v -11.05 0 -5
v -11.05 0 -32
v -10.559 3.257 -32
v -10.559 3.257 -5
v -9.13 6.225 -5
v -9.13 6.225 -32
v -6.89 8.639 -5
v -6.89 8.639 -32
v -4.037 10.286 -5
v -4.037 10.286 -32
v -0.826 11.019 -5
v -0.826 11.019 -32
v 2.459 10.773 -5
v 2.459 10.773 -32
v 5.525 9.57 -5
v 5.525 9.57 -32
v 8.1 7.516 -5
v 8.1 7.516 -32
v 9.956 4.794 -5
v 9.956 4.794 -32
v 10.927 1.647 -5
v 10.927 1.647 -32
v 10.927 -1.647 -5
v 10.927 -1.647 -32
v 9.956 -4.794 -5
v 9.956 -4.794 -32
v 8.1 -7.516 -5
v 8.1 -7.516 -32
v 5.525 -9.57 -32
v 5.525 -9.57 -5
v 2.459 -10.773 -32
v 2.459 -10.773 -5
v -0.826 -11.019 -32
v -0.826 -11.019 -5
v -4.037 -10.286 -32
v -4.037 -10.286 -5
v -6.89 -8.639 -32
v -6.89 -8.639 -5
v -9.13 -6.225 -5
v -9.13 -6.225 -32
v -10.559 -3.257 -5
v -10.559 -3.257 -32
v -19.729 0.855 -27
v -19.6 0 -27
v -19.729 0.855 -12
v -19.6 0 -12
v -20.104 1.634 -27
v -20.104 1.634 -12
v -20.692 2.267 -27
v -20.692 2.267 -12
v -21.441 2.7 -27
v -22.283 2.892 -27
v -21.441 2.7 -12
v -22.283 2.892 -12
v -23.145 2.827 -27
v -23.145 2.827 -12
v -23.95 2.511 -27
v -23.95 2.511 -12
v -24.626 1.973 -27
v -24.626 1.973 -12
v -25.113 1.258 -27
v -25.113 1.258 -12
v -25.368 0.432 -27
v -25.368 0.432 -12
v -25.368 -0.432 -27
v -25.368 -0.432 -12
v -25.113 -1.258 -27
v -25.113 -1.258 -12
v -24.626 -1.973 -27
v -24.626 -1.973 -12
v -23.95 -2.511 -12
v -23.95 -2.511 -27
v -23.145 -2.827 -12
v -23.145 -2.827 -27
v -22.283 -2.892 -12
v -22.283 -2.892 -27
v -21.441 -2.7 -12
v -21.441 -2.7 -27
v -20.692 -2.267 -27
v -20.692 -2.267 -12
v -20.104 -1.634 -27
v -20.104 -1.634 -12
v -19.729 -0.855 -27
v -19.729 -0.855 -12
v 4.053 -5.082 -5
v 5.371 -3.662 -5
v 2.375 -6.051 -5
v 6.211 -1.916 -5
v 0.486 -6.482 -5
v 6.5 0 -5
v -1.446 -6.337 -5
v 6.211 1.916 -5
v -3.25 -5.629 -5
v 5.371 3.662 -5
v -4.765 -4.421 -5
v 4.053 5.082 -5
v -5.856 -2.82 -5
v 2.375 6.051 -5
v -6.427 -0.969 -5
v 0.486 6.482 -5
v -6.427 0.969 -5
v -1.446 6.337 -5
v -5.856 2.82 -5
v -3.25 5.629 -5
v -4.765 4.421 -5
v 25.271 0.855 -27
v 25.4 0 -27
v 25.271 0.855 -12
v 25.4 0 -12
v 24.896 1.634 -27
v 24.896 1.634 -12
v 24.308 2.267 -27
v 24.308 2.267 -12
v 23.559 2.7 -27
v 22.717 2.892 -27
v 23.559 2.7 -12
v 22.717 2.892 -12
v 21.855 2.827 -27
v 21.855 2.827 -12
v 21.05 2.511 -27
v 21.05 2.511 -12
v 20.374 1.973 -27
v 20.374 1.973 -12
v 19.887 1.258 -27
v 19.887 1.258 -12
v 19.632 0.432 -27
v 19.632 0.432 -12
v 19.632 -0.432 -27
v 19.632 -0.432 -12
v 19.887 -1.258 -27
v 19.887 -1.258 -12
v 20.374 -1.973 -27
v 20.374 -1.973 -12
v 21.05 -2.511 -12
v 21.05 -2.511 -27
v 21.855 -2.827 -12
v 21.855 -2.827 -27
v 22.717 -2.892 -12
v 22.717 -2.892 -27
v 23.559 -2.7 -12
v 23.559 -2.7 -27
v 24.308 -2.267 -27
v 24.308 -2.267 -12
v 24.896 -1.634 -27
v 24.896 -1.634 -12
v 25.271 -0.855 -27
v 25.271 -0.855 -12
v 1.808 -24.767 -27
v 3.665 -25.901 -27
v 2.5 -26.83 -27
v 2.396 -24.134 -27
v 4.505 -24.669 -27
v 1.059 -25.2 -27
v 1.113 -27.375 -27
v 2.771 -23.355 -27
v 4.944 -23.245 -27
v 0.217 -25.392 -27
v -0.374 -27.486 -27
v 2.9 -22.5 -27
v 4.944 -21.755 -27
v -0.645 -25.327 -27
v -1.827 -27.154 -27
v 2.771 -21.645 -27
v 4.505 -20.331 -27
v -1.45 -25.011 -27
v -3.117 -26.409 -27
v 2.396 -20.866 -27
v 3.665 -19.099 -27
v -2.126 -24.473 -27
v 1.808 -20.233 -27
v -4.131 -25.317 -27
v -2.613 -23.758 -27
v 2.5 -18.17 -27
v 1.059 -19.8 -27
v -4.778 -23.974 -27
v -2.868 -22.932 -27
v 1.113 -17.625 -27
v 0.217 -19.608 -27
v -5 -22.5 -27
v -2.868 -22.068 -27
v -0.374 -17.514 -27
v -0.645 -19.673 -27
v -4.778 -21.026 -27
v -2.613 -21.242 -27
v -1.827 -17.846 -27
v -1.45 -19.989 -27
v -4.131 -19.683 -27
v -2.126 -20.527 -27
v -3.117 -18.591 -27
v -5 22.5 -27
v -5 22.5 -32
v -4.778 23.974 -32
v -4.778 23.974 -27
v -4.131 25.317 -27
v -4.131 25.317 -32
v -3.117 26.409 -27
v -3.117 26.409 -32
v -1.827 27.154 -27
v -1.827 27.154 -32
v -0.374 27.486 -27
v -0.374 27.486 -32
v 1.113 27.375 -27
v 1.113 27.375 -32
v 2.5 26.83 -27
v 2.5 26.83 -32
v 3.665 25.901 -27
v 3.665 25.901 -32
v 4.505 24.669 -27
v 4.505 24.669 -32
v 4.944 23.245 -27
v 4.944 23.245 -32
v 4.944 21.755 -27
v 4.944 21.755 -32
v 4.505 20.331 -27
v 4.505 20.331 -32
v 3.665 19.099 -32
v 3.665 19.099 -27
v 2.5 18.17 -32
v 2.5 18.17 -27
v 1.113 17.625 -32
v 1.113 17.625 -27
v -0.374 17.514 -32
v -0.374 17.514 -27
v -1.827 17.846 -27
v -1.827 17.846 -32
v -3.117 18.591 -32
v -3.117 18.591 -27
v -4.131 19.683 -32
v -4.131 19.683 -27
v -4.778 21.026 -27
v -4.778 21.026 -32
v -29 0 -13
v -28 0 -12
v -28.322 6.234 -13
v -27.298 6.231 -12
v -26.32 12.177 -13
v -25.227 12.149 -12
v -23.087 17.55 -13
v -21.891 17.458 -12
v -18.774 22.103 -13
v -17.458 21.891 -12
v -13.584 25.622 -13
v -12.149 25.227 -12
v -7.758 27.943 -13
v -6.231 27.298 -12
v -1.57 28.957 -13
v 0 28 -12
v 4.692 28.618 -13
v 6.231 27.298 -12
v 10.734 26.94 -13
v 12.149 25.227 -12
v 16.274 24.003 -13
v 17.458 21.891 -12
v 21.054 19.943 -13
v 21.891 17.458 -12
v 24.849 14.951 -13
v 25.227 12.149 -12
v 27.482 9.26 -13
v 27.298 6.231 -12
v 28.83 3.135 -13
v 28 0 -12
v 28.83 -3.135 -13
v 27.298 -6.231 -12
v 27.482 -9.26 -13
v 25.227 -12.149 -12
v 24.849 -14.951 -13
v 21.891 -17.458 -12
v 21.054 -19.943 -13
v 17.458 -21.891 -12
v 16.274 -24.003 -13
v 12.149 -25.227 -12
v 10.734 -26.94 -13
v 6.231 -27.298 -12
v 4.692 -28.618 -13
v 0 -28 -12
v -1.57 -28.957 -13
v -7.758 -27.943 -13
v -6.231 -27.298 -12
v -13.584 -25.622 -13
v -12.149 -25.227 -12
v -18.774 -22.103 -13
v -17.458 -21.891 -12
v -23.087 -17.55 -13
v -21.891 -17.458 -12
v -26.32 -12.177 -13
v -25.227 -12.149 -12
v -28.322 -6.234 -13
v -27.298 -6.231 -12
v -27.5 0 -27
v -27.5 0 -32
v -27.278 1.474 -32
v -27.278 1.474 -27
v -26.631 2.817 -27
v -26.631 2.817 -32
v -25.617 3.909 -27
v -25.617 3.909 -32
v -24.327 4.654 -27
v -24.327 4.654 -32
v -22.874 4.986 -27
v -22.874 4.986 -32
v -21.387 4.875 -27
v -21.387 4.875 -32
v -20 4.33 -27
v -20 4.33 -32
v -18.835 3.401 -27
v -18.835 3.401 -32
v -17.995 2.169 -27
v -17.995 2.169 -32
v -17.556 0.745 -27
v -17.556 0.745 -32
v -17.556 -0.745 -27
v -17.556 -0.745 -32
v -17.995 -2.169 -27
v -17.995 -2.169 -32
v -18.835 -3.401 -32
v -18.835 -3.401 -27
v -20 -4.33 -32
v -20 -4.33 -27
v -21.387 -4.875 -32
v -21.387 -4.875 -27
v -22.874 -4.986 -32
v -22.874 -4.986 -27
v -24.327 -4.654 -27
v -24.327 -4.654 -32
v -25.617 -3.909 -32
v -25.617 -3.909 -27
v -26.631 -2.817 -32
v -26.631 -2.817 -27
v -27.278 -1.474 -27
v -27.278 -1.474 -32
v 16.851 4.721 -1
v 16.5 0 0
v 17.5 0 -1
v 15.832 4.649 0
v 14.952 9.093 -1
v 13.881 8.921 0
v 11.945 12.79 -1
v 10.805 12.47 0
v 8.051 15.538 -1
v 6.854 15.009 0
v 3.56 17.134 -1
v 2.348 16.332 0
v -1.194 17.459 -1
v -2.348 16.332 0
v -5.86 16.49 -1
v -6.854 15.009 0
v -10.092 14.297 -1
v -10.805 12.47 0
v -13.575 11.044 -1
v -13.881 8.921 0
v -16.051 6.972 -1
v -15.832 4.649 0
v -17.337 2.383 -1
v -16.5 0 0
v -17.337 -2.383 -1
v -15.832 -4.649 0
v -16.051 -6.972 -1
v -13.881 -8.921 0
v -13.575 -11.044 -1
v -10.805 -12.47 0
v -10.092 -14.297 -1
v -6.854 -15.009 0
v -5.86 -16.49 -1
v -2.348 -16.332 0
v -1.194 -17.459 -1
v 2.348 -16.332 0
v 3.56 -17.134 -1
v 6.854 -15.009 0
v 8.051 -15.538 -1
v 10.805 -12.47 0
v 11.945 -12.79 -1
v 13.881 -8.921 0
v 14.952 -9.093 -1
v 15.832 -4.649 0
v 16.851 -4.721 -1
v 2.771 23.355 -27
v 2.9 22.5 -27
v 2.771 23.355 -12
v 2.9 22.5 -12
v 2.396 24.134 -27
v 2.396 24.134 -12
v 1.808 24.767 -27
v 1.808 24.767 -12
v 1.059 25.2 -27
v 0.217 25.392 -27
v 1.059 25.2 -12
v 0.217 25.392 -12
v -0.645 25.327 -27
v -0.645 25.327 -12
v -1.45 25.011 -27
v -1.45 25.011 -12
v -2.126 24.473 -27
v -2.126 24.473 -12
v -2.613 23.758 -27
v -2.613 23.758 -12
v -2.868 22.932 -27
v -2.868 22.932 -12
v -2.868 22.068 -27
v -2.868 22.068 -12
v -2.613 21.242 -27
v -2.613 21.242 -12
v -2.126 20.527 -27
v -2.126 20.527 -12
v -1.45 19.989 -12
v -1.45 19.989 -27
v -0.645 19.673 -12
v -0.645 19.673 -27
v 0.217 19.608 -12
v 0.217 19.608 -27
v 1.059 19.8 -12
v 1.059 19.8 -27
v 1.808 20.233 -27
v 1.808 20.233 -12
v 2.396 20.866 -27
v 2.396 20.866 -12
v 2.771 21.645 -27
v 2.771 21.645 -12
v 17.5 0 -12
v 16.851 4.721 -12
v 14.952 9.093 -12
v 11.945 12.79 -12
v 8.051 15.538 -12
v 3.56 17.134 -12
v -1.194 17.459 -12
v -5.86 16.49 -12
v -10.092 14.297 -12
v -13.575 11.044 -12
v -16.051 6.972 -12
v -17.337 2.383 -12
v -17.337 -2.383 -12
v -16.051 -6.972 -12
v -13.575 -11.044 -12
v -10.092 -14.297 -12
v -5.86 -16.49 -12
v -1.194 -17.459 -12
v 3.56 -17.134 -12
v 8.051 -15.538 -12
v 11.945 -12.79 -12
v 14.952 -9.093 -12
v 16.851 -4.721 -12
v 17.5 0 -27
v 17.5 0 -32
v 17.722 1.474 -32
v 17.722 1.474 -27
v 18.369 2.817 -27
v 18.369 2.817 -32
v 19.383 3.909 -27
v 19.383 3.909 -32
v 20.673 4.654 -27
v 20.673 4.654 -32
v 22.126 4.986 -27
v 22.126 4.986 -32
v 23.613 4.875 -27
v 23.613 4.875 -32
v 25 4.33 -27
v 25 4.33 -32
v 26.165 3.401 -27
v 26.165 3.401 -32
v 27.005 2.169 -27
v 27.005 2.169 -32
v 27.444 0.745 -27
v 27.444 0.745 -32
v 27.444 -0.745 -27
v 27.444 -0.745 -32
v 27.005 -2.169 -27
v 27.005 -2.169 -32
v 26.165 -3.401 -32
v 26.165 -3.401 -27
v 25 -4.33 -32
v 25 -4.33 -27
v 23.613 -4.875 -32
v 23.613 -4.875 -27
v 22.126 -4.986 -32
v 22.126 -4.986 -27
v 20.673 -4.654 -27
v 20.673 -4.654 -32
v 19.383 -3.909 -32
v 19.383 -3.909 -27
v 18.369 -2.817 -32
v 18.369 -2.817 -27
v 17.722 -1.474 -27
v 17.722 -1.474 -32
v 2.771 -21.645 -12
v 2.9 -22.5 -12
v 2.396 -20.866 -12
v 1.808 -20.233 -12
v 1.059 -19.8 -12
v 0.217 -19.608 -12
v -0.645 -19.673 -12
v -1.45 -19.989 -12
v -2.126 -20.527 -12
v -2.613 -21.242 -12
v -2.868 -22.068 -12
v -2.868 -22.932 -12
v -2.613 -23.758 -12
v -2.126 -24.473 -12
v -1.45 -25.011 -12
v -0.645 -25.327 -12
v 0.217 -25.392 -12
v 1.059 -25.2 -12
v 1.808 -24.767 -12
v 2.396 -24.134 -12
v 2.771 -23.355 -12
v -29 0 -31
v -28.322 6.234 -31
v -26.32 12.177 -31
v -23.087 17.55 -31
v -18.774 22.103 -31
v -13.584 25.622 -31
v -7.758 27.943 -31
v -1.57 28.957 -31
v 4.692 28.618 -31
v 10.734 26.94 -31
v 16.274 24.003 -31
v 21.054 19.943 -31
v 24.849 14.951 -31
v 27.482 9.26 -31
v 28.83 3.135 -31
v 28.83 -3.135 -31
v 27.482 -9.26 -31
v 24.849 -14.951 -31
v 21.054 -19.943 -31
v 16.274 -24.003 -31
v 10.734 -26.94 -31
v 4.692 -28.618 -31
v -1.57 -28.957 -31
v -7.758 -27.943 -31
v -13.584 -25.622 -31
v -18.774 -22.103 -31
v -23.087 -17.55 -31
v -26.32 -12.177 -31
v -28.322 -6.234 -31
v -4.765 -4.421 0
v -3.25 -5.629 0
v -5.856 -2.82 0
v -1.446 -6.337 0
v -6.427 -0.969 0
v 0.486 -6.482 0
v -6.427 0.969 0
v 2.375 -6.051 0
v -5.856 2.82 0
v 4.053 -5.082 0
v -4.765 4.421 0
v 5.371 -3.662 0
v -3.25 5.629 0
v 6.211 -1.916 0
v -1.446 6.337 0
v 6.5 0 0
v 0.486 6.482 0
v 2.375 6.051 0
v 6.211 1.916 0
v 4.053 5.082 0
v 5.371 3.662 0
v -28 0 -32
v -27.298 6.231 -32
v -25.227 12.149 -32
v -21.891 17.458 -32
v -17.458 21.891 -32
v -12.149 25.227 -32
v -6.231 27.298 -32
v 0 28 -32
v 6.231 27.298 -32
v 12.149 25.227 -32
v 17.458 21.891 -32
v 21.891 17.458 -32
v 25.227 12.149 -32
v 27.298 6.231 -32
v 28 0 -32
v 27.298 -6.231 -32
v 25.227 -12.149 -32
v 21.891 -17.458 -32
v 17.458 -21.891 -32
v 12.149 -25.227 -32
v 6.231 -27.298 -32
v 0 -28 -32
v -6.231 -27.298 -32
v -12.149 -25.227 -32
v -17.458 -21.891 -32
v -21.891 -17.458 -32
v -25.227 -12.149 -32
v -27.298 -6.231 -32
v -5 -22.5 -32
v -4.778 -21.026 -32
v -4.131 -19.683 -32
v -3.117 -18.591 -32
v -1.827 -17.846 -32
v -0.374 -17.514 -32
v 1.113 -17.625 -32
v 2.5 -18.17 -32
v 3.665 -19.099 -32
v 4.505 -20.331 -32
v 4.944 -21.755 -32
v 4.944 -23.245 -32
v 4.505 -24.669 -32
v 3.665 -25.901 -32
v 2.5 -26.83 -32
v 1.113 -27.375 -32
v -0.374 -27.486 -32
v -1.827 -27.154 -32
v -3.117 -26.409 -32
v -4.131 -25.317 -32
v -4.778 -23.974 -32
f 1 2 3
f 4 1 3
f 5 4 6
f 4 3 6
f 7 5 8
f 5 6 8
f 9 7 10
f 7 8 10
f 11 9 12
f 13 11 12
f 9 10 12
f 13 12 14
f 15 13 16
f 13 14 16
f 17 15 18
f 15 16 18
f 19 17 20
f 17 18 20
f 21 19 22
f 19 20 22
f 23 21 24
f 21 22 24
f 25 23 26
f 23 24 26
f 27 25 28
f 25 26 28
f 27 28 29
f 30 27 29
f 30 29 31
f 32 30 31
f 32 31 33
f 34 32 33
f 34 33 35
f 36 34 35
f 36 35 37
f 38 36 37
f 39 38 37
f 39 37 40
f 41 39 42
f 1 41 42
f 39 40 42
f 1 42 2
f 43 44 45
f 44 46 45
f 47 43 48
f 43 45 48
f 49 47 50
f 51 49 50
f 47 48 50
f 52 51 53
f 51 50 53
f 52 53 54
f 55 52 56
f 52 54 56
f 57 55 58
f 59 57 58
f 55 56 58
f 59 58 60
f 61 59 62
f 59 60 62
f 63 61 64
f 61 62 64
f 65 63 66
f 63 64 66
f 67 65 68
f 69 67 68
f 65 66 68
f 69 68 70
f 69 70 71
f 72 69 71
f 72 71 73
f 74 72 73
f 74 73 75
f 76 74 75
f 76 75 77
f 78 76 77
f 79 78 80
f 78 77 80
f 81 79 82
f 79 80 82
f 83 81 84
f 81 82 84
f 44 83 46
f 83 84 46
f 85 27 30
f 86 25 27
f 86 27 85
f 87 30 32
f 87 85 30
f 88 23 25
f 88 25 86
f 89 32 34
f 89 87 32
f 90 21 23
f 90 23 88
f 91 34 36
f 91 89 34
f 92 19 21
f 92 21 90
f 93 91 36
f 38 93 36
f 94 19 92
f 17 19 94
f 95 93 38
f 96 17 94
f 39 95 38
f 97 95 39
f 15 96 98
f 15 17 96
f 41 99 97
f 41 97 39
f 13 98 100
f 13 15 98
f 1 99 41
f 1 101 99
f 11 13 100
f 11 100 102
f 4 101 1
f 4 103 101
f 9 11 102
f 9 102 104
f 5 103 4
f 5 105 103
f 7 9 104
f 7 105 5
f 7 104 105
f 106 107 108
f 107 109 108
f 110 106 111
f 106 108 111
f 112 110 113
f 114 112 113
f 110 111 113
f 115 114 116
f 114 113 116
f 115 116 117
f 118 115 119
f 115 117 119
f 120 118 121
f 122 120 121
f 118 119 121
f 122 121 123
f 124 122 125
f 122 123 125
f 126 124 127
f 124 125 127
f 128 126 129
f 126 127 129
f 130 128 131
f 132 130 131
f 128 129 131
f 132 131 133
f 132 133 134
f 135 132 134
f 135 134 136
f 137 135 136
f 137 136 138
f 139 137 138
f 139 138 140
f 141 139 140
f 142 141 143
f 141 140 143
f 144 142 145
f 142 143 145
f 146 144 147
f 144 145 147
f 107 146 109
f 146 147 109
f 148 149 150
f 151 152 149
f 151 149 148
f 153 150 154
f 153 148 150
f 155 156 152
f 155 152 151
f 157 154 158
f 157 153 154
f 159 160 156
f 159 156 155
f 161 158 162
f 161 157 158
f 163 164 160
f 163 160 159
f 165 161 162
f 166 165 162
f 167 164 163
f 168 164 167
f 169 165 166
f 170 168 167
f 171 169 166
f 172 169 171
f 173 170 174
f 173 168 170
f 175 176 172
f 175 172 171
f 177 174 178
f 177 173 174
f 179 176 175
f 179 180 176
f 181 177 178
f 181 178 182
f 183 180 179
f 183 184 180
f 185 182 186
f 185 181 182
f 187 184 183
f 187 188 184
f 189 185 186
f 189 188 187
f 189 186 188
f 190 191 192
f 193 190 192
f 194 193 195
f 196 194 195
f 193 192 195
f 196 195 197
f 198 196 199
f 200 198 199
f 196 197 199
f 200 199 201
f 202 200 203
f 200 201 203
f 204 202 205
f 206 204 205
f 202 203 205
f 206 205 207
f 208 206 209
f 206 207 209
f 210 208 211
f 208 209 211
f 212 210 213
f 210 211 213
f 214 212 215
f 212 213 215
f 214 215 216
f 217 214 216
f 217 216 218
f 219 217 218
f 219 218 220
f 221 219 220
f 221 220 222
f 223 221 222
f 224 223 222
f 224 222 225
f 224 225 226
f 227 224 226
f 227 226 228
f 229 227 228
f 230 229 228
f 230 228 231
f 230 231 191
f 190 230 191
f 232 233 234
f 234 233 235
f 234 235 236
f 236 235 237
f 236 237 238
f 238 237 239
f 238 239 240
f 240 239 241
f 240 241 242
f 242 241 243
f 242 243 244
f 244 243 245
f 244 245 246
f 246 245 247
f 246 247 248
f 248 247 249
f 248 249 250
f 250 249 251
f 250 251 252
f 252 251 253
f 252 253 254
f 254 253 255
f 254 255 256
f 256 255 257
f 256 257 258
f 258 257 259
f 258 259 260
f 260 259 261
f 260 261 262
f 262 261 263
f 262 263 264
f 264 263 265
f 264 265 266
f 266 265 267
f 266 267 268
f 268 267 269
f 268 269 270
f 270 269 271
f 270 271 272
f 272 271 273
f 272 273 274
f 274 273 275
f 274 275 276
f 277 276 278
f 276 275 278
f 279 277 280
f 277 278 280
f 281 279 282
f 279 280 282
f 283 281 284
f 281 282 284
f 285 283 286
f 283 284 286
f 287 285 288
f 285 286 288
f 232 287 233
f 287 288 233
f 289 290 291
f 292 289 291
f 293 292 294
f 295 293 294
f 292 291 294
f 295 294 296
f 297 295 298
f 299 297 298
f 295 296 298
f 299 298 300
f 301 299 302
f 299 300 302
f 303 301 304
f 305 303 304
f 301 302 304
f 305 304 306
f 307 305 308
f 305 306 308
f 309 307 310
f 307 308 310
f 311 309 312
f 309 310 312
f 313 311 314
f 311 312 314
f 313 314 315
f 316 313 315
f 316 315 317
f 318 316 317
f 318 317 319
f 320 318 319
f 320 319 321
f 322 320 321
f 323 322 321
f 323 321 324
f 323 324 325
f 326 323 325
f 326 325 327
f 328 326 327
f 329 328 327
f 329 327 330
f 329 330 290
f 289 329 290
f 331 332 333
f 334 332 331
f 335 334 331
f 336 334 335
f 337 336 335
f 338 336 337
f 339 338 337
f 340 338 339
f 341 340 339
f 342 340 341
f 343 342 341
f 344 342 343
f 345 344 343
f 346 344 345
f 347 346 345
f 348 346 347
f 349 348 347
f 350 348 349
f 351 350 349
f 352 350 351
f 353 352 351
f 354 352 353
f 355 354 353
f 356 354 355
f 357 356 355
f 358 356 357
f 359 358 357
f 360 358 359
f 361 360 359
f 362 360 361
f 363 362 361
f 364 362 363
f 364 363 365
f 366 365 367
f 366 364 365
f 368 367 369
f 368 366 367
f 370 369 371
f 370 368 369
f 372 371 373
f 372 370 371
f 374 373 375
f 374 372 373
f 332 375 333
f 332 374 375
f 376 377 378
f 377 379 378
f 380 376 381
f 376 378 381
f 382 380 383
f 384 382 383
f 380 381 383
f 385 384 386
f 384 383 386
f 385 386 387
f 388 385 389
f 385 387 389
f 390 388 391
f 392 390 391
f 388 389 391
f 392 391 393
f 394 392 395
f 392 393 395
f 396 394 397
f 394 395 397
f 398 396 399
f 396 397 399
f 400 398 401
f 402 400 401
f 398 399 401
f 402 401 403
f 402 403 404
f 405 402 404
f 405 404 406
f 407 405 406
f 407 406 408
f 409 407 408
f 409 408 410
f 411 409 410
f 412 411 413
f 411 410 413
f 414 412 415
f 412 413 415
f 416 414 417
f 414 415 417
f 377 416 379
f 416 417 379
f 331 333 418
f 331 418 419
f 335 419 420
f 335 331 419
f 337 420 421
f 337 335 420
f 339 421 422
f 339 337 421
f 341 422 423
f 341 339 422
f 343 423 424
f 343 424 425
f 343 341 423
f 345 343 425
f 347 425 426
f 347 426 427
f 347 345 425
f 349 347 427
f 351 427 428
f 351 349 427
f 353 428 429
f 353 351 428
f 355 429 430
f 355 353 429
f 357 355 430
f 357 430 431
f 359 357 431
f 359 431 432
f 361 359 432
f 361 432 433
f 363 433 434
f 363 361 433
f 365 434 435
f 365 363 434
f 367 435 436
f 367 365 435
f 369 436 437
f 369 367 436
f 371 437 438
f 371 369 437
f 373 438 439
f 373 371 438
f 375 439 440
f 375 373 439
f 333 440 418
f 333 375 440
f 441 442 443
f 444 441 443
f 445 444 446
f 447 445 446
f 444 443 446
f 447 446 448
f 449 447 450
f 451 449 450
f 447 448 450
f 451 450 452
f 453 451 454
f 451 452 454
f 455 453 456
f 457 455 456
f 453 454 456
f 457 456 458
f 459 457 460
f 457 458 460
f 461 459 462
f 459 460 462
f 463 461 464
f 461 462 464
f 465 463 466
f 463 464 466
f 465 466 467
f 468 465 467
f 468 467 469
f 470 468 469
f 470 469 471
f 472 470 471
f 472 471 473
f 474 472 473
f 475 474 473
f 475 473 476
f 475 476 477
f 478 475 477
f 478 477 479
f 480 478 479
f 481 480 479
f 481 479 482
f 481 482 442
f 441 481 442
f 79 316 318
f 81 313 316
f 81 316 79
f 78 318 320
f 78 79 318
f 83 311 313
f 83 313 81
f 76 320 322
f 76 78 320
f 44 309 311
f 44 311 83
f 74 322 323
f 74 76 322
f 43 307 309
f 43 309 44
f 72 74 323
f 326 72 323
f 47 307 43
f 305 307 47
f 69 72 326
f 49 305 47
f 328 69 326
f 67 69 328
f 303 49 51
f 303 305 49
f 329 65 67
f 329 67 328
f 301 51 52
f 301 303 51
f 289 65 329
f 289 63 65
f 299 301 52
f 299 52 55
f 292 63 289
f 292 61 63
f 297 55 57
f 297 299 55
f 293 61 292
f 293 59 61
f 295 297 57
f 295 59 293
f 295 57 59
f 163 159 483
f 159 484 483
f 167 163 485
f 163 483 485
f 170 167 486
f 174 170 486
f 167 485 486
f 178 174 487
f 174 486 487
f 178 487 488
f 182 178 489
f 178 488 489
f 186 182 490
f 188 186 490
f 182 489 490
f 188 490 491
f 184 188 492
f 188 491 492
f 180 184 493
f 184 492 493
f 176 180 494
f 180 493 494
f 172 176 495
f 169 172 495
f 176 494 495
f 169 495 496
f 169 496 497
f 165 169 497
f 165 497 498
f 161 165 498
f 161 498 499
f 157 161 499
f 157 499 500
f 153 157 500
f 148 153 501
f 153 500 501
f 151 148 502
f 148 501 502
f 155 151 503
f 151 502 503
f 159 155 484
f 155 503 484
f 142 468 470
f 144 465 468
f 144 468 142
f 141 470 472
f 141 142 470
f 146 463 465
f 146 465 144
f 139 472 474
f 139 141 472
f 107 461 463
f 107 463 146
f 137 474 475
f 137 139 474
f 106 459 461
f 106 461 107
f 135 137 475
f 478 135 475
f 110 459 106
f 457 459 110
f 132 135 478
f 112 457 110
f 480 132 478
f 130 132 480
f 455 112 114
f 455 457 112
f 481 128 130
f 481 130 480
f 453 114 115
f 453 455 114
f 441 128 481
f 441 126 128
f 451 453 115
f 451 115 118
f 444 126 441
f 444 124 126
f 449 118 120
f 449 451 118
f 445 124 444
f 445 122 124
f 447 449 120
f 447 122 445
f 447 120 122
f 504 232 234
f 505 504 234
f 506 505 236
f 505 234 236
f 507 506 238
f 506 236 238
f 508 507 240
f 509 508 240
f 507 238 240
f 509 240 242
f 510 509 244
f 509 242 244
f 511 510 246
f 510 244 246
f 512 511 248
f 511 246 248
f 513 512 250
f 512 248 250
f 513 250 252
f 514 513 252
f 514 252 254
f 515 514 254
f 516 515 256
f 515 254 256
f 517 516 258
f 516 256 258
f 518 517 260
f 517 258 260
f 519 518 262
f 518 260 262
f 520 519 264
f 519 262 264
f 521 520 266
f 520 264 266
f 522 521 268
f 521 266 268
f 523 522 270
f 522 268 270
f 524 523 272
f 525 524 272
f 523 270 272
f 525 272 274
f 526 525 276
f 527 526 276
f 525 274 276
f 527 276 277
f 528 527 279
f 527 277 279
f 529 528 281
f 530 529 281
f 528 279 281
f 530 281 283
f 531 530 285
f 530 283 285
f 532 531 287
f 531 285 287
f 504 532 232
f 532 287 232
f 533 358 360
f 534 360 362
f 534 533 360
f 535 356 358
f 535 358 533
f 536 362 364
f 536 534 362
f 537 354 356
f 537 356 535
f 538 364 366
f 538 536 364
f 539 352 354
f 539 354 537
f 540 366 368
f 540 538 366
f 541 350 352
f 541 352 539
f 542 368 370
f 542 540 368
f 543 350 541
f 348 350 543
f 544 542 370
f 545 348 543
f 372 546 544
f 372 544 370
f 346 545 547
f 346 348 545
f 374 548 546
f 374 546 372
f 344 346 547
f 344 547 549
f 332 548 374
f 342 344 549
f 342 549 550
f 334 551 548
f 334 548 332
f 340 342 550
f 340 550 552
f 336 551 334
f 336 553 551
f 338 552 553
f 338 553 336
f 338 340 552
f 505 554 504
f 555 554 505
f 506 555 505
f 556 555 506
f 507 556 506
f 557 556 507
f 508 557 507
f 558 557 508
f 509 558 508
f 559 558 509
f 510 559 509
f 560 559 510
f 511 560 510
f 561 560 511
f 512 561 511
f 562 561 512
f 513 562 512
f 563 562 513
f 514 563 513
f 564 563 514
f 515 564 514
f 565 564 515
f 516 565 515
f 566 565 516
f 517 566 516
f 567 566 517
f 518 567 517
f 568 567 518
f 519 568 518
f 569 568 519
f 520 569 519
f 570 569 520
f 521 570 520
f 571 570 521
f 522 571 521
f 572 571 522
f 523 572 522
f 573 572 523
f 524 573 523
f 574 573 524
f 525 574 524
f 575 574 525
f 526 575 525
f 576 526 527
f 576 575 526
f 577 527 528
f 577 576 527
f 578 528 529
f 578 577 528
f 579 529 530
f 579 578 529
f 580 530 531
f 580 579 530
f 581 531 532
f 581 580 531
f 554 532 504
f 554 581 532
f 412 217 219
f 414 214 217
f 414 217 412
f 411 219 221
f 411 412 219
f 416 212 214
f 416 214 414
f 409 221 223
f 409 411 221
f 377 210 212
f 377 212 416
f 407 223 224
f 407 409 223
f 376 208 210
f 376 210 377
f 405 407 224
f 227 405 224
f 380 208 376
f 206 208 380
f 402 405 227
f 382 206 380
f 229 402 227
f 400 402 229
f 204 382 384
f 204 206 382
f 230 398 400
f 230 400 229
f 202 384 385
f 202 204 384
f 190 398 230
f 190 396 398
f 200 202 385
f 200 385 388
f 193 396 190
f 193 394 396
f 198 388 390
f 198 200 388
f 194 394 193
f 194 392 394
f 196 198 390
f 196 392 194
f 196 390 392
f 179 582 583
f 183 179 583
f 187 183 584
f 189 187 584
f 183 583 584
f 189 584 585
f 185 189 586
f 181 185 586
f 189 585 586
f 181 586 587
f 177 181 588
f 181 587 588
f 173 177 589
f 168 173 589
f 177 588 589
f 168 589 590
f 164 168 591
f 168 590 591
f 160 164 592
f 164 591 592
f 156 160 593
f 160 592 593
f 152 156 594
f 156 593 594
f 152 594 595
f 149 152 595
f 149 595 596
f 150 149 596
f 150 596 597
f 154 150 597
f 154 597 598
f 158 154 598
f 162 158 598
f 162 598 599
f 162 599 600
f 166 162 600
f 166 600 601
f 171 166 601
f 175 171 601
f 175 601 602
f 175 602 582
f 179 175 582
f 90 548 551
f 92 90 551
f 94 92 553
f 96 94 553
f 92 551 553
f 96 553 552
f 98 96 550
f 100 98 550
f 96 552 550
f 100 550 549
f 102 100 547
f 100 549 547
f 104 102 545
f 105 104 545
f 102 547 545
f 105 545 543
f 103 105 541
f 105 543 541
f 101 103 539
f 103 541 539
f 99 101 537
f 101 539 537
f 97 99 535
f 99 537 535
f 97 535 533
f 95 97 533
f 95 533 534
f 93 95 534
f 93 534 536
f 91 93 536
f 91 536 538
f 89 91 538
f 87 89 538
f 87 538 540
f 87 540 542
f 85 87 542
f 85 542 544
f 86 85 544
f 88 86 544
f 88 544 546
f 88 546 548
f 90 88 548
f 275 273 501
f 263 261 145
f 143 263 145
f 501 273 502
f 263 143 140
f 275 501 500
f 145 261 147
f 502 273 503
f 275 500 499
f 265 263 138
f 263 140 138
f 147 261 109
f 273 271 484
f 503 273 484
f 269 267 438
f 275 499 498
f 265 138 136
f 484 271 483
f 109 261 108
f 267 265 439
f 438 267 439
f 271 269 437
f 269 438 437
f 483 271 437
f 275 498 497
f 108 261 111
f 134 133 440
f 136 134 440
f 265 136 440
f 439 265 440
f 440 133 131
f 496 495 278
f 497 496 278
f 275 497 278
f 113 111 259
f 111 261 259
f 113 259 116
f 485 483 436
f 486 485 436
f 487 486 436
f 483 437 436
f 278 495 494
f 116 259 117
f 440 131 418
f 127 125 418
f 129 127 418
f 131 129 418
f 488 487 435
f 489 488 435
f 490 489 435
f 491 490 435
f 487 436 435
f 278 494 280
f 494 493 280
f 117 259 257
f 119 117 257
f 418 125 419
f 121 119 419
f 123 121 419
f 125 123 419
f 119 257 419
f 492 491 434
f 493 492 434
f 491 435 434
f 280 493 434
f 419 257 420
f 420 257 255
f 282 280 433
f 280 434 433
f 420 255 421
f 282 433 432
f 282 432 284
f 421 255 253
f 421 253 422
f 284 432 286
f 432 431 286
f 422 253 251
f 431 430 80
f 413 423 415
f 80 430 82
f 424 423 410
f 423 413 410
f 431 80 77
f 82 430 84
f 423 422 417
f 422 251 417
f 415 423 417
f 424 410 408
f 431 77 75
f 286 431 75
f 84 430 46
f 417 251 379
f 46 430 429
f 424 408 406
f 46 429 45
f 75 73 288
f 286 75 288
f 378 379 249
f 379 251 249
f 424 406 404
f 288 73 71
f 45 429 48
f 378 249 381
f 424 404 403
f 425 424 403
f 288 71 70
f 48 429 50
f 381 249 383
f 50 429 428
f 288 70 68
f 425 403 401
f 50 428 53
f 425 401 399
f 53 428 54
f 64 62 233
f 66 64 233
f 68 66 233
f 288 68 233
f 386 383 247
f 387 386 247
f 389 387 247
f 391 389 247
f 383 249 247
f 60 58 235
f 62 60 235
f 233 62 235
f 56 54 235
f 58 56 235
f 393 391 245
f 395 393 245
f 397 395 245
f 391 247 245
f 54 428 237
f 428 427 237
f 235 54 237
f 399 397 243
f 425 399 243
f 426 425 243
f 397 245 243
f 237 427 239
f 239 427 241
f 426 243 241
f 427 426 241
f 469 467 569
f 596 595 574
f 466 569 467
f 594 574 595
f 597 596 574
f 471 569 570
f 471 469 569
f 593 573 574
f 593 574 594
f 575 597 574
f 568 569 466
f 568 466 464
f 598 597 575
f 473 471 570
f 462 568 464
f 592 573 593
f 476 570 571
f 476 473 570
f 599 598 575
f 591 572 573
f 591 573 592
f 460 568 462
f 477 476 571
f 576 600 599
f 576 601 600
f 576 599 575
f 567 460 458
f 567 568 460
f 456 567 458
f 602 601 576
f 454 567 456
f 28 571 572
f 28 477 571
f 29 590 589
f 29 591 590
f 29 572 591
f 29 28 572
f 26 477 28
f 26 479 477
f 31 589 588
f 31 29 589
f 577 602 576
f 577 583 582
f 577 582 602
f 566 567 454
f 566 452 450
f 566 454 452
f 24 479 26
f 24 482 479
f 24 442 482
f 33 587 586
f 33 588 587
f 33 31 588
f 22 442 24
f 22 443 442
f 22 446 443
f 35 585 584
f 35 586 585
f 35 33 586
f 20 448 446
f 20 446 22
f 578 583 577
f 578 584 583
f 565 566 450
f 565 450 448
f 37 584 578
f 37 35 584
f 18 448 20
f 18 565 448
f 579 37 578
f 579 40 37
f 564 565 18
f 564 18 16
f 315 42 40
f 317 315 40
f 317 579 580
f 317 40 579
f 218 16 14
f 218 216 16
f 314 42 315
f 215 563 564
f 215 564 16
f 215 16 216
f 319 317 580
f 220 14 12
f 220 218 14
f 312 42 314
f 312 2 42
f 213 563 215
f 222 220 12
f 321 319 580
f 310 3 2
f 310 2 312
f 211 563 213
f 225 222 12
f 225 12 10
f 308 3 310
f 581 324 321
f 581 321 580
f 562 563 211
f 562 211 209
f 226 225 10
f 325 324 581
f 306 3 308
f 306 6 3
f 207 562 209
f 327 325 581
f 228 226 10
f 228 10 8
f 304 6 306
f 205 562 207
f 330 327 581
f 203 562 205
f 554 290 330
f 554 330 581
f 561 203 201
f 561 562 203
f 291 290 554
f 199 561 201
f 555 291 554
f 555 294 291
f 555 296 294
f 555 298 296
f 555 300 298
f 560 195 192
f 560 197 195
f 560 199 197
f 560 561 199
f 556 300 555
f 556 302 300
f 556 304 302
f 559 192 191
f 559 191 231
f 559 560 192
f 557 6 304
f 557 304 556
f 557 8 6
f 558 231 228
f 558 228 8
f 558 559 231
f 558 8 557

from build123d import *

# Parameters (mm, degrees)
SKETCH_1_R                   = 17.5
EXTRUDE_1_DEPTH              = 12
SKETCH_2_R                   = 29
EXTRUDE_2_DEPTH              = 20
SKETCH_3_R                   = 6.5
CUT_EXTRUDE_1_DEPTH          = 53.019227215
SKETCH_4_R                   = 11.05
CUT_EXTRUDE_2_DEPTH          = 27
CHAMFER_1_SIZE               = 1
HOLE_WIZARD_M5_1_D           = 5.8
HOLE_WIZARD_M5_1_CBORE_D     = 10
HOLE_WIZARD_M5_1_CBORE_DEPTH = 5


with BuildPart() as part:
    # 草图1 → 凸台-拉伸1 (new body)
    with BuildSketch(Plane.XY):
        Circle(SKETCH_1_R)
    extrude(amount=-EXTRUDE_1_DEPTH)

    # 草图2 → 凸台-拉伸2 (add)
    with BuildSketch(Plane(origin=(0, 0, -12), x_dir=(-1, 0, 0), z_dir=(0, 0, -1))):
        Circle(SKETCH_2_R)
    extrude(amount=EXTRUDE_2_DEPTH)

    # 草图3 → 切除-拉伸1 (cut, through all)
    with BuildSketch(Plane.XY):
        Circle(SKETCH_3_R)
    extrude(amount=-CUT_EXTRUDE_1_DEPTH, mode=Mode.SUBTRACT)

    # 草图4 → 切除-拉伸2 (cut)
    with BuildSketch(Plane(origin=(0, 0, -32), x_dir=(-1, 0, 0), z_dir=(0, 0, -1))):
        Circle(SKETCH_4_R)
    extrude(amount=-CUT_EXTRUDE_2_DEPTH, mode=Mode.SUBTRACT)

    # 倒角1
    chamfer_1_edges = [part.edges().sort_by_distance(p)[0] for p in [
        (-17.5, 0, 0),
        (29, 0, -12),
        (29, 0, -32),
    ]]
    chamfer(chamfer_1_edges, length=CHAMFER_1_SIZE)

    # M5 六角凹头螺钉的柱形沉头孔1 (through all)
    with Locations(Plane(origin=(0, 0, -32), x_dir=(-1, 0, 0), z_dir=(0, 0, -1))):
        with Locations((0, 22.5), (-22.5, 0), (0, -22.5), (22.5, 0)):
            CounterBoreHole(HOLE_WIZARD_M5_1_D / 2, HOLE_WIZARD_M5_1_CBORE_D / 2, HOLE_WIZARD_M5_1_CBORE_DEPTH)


solid = part.part
